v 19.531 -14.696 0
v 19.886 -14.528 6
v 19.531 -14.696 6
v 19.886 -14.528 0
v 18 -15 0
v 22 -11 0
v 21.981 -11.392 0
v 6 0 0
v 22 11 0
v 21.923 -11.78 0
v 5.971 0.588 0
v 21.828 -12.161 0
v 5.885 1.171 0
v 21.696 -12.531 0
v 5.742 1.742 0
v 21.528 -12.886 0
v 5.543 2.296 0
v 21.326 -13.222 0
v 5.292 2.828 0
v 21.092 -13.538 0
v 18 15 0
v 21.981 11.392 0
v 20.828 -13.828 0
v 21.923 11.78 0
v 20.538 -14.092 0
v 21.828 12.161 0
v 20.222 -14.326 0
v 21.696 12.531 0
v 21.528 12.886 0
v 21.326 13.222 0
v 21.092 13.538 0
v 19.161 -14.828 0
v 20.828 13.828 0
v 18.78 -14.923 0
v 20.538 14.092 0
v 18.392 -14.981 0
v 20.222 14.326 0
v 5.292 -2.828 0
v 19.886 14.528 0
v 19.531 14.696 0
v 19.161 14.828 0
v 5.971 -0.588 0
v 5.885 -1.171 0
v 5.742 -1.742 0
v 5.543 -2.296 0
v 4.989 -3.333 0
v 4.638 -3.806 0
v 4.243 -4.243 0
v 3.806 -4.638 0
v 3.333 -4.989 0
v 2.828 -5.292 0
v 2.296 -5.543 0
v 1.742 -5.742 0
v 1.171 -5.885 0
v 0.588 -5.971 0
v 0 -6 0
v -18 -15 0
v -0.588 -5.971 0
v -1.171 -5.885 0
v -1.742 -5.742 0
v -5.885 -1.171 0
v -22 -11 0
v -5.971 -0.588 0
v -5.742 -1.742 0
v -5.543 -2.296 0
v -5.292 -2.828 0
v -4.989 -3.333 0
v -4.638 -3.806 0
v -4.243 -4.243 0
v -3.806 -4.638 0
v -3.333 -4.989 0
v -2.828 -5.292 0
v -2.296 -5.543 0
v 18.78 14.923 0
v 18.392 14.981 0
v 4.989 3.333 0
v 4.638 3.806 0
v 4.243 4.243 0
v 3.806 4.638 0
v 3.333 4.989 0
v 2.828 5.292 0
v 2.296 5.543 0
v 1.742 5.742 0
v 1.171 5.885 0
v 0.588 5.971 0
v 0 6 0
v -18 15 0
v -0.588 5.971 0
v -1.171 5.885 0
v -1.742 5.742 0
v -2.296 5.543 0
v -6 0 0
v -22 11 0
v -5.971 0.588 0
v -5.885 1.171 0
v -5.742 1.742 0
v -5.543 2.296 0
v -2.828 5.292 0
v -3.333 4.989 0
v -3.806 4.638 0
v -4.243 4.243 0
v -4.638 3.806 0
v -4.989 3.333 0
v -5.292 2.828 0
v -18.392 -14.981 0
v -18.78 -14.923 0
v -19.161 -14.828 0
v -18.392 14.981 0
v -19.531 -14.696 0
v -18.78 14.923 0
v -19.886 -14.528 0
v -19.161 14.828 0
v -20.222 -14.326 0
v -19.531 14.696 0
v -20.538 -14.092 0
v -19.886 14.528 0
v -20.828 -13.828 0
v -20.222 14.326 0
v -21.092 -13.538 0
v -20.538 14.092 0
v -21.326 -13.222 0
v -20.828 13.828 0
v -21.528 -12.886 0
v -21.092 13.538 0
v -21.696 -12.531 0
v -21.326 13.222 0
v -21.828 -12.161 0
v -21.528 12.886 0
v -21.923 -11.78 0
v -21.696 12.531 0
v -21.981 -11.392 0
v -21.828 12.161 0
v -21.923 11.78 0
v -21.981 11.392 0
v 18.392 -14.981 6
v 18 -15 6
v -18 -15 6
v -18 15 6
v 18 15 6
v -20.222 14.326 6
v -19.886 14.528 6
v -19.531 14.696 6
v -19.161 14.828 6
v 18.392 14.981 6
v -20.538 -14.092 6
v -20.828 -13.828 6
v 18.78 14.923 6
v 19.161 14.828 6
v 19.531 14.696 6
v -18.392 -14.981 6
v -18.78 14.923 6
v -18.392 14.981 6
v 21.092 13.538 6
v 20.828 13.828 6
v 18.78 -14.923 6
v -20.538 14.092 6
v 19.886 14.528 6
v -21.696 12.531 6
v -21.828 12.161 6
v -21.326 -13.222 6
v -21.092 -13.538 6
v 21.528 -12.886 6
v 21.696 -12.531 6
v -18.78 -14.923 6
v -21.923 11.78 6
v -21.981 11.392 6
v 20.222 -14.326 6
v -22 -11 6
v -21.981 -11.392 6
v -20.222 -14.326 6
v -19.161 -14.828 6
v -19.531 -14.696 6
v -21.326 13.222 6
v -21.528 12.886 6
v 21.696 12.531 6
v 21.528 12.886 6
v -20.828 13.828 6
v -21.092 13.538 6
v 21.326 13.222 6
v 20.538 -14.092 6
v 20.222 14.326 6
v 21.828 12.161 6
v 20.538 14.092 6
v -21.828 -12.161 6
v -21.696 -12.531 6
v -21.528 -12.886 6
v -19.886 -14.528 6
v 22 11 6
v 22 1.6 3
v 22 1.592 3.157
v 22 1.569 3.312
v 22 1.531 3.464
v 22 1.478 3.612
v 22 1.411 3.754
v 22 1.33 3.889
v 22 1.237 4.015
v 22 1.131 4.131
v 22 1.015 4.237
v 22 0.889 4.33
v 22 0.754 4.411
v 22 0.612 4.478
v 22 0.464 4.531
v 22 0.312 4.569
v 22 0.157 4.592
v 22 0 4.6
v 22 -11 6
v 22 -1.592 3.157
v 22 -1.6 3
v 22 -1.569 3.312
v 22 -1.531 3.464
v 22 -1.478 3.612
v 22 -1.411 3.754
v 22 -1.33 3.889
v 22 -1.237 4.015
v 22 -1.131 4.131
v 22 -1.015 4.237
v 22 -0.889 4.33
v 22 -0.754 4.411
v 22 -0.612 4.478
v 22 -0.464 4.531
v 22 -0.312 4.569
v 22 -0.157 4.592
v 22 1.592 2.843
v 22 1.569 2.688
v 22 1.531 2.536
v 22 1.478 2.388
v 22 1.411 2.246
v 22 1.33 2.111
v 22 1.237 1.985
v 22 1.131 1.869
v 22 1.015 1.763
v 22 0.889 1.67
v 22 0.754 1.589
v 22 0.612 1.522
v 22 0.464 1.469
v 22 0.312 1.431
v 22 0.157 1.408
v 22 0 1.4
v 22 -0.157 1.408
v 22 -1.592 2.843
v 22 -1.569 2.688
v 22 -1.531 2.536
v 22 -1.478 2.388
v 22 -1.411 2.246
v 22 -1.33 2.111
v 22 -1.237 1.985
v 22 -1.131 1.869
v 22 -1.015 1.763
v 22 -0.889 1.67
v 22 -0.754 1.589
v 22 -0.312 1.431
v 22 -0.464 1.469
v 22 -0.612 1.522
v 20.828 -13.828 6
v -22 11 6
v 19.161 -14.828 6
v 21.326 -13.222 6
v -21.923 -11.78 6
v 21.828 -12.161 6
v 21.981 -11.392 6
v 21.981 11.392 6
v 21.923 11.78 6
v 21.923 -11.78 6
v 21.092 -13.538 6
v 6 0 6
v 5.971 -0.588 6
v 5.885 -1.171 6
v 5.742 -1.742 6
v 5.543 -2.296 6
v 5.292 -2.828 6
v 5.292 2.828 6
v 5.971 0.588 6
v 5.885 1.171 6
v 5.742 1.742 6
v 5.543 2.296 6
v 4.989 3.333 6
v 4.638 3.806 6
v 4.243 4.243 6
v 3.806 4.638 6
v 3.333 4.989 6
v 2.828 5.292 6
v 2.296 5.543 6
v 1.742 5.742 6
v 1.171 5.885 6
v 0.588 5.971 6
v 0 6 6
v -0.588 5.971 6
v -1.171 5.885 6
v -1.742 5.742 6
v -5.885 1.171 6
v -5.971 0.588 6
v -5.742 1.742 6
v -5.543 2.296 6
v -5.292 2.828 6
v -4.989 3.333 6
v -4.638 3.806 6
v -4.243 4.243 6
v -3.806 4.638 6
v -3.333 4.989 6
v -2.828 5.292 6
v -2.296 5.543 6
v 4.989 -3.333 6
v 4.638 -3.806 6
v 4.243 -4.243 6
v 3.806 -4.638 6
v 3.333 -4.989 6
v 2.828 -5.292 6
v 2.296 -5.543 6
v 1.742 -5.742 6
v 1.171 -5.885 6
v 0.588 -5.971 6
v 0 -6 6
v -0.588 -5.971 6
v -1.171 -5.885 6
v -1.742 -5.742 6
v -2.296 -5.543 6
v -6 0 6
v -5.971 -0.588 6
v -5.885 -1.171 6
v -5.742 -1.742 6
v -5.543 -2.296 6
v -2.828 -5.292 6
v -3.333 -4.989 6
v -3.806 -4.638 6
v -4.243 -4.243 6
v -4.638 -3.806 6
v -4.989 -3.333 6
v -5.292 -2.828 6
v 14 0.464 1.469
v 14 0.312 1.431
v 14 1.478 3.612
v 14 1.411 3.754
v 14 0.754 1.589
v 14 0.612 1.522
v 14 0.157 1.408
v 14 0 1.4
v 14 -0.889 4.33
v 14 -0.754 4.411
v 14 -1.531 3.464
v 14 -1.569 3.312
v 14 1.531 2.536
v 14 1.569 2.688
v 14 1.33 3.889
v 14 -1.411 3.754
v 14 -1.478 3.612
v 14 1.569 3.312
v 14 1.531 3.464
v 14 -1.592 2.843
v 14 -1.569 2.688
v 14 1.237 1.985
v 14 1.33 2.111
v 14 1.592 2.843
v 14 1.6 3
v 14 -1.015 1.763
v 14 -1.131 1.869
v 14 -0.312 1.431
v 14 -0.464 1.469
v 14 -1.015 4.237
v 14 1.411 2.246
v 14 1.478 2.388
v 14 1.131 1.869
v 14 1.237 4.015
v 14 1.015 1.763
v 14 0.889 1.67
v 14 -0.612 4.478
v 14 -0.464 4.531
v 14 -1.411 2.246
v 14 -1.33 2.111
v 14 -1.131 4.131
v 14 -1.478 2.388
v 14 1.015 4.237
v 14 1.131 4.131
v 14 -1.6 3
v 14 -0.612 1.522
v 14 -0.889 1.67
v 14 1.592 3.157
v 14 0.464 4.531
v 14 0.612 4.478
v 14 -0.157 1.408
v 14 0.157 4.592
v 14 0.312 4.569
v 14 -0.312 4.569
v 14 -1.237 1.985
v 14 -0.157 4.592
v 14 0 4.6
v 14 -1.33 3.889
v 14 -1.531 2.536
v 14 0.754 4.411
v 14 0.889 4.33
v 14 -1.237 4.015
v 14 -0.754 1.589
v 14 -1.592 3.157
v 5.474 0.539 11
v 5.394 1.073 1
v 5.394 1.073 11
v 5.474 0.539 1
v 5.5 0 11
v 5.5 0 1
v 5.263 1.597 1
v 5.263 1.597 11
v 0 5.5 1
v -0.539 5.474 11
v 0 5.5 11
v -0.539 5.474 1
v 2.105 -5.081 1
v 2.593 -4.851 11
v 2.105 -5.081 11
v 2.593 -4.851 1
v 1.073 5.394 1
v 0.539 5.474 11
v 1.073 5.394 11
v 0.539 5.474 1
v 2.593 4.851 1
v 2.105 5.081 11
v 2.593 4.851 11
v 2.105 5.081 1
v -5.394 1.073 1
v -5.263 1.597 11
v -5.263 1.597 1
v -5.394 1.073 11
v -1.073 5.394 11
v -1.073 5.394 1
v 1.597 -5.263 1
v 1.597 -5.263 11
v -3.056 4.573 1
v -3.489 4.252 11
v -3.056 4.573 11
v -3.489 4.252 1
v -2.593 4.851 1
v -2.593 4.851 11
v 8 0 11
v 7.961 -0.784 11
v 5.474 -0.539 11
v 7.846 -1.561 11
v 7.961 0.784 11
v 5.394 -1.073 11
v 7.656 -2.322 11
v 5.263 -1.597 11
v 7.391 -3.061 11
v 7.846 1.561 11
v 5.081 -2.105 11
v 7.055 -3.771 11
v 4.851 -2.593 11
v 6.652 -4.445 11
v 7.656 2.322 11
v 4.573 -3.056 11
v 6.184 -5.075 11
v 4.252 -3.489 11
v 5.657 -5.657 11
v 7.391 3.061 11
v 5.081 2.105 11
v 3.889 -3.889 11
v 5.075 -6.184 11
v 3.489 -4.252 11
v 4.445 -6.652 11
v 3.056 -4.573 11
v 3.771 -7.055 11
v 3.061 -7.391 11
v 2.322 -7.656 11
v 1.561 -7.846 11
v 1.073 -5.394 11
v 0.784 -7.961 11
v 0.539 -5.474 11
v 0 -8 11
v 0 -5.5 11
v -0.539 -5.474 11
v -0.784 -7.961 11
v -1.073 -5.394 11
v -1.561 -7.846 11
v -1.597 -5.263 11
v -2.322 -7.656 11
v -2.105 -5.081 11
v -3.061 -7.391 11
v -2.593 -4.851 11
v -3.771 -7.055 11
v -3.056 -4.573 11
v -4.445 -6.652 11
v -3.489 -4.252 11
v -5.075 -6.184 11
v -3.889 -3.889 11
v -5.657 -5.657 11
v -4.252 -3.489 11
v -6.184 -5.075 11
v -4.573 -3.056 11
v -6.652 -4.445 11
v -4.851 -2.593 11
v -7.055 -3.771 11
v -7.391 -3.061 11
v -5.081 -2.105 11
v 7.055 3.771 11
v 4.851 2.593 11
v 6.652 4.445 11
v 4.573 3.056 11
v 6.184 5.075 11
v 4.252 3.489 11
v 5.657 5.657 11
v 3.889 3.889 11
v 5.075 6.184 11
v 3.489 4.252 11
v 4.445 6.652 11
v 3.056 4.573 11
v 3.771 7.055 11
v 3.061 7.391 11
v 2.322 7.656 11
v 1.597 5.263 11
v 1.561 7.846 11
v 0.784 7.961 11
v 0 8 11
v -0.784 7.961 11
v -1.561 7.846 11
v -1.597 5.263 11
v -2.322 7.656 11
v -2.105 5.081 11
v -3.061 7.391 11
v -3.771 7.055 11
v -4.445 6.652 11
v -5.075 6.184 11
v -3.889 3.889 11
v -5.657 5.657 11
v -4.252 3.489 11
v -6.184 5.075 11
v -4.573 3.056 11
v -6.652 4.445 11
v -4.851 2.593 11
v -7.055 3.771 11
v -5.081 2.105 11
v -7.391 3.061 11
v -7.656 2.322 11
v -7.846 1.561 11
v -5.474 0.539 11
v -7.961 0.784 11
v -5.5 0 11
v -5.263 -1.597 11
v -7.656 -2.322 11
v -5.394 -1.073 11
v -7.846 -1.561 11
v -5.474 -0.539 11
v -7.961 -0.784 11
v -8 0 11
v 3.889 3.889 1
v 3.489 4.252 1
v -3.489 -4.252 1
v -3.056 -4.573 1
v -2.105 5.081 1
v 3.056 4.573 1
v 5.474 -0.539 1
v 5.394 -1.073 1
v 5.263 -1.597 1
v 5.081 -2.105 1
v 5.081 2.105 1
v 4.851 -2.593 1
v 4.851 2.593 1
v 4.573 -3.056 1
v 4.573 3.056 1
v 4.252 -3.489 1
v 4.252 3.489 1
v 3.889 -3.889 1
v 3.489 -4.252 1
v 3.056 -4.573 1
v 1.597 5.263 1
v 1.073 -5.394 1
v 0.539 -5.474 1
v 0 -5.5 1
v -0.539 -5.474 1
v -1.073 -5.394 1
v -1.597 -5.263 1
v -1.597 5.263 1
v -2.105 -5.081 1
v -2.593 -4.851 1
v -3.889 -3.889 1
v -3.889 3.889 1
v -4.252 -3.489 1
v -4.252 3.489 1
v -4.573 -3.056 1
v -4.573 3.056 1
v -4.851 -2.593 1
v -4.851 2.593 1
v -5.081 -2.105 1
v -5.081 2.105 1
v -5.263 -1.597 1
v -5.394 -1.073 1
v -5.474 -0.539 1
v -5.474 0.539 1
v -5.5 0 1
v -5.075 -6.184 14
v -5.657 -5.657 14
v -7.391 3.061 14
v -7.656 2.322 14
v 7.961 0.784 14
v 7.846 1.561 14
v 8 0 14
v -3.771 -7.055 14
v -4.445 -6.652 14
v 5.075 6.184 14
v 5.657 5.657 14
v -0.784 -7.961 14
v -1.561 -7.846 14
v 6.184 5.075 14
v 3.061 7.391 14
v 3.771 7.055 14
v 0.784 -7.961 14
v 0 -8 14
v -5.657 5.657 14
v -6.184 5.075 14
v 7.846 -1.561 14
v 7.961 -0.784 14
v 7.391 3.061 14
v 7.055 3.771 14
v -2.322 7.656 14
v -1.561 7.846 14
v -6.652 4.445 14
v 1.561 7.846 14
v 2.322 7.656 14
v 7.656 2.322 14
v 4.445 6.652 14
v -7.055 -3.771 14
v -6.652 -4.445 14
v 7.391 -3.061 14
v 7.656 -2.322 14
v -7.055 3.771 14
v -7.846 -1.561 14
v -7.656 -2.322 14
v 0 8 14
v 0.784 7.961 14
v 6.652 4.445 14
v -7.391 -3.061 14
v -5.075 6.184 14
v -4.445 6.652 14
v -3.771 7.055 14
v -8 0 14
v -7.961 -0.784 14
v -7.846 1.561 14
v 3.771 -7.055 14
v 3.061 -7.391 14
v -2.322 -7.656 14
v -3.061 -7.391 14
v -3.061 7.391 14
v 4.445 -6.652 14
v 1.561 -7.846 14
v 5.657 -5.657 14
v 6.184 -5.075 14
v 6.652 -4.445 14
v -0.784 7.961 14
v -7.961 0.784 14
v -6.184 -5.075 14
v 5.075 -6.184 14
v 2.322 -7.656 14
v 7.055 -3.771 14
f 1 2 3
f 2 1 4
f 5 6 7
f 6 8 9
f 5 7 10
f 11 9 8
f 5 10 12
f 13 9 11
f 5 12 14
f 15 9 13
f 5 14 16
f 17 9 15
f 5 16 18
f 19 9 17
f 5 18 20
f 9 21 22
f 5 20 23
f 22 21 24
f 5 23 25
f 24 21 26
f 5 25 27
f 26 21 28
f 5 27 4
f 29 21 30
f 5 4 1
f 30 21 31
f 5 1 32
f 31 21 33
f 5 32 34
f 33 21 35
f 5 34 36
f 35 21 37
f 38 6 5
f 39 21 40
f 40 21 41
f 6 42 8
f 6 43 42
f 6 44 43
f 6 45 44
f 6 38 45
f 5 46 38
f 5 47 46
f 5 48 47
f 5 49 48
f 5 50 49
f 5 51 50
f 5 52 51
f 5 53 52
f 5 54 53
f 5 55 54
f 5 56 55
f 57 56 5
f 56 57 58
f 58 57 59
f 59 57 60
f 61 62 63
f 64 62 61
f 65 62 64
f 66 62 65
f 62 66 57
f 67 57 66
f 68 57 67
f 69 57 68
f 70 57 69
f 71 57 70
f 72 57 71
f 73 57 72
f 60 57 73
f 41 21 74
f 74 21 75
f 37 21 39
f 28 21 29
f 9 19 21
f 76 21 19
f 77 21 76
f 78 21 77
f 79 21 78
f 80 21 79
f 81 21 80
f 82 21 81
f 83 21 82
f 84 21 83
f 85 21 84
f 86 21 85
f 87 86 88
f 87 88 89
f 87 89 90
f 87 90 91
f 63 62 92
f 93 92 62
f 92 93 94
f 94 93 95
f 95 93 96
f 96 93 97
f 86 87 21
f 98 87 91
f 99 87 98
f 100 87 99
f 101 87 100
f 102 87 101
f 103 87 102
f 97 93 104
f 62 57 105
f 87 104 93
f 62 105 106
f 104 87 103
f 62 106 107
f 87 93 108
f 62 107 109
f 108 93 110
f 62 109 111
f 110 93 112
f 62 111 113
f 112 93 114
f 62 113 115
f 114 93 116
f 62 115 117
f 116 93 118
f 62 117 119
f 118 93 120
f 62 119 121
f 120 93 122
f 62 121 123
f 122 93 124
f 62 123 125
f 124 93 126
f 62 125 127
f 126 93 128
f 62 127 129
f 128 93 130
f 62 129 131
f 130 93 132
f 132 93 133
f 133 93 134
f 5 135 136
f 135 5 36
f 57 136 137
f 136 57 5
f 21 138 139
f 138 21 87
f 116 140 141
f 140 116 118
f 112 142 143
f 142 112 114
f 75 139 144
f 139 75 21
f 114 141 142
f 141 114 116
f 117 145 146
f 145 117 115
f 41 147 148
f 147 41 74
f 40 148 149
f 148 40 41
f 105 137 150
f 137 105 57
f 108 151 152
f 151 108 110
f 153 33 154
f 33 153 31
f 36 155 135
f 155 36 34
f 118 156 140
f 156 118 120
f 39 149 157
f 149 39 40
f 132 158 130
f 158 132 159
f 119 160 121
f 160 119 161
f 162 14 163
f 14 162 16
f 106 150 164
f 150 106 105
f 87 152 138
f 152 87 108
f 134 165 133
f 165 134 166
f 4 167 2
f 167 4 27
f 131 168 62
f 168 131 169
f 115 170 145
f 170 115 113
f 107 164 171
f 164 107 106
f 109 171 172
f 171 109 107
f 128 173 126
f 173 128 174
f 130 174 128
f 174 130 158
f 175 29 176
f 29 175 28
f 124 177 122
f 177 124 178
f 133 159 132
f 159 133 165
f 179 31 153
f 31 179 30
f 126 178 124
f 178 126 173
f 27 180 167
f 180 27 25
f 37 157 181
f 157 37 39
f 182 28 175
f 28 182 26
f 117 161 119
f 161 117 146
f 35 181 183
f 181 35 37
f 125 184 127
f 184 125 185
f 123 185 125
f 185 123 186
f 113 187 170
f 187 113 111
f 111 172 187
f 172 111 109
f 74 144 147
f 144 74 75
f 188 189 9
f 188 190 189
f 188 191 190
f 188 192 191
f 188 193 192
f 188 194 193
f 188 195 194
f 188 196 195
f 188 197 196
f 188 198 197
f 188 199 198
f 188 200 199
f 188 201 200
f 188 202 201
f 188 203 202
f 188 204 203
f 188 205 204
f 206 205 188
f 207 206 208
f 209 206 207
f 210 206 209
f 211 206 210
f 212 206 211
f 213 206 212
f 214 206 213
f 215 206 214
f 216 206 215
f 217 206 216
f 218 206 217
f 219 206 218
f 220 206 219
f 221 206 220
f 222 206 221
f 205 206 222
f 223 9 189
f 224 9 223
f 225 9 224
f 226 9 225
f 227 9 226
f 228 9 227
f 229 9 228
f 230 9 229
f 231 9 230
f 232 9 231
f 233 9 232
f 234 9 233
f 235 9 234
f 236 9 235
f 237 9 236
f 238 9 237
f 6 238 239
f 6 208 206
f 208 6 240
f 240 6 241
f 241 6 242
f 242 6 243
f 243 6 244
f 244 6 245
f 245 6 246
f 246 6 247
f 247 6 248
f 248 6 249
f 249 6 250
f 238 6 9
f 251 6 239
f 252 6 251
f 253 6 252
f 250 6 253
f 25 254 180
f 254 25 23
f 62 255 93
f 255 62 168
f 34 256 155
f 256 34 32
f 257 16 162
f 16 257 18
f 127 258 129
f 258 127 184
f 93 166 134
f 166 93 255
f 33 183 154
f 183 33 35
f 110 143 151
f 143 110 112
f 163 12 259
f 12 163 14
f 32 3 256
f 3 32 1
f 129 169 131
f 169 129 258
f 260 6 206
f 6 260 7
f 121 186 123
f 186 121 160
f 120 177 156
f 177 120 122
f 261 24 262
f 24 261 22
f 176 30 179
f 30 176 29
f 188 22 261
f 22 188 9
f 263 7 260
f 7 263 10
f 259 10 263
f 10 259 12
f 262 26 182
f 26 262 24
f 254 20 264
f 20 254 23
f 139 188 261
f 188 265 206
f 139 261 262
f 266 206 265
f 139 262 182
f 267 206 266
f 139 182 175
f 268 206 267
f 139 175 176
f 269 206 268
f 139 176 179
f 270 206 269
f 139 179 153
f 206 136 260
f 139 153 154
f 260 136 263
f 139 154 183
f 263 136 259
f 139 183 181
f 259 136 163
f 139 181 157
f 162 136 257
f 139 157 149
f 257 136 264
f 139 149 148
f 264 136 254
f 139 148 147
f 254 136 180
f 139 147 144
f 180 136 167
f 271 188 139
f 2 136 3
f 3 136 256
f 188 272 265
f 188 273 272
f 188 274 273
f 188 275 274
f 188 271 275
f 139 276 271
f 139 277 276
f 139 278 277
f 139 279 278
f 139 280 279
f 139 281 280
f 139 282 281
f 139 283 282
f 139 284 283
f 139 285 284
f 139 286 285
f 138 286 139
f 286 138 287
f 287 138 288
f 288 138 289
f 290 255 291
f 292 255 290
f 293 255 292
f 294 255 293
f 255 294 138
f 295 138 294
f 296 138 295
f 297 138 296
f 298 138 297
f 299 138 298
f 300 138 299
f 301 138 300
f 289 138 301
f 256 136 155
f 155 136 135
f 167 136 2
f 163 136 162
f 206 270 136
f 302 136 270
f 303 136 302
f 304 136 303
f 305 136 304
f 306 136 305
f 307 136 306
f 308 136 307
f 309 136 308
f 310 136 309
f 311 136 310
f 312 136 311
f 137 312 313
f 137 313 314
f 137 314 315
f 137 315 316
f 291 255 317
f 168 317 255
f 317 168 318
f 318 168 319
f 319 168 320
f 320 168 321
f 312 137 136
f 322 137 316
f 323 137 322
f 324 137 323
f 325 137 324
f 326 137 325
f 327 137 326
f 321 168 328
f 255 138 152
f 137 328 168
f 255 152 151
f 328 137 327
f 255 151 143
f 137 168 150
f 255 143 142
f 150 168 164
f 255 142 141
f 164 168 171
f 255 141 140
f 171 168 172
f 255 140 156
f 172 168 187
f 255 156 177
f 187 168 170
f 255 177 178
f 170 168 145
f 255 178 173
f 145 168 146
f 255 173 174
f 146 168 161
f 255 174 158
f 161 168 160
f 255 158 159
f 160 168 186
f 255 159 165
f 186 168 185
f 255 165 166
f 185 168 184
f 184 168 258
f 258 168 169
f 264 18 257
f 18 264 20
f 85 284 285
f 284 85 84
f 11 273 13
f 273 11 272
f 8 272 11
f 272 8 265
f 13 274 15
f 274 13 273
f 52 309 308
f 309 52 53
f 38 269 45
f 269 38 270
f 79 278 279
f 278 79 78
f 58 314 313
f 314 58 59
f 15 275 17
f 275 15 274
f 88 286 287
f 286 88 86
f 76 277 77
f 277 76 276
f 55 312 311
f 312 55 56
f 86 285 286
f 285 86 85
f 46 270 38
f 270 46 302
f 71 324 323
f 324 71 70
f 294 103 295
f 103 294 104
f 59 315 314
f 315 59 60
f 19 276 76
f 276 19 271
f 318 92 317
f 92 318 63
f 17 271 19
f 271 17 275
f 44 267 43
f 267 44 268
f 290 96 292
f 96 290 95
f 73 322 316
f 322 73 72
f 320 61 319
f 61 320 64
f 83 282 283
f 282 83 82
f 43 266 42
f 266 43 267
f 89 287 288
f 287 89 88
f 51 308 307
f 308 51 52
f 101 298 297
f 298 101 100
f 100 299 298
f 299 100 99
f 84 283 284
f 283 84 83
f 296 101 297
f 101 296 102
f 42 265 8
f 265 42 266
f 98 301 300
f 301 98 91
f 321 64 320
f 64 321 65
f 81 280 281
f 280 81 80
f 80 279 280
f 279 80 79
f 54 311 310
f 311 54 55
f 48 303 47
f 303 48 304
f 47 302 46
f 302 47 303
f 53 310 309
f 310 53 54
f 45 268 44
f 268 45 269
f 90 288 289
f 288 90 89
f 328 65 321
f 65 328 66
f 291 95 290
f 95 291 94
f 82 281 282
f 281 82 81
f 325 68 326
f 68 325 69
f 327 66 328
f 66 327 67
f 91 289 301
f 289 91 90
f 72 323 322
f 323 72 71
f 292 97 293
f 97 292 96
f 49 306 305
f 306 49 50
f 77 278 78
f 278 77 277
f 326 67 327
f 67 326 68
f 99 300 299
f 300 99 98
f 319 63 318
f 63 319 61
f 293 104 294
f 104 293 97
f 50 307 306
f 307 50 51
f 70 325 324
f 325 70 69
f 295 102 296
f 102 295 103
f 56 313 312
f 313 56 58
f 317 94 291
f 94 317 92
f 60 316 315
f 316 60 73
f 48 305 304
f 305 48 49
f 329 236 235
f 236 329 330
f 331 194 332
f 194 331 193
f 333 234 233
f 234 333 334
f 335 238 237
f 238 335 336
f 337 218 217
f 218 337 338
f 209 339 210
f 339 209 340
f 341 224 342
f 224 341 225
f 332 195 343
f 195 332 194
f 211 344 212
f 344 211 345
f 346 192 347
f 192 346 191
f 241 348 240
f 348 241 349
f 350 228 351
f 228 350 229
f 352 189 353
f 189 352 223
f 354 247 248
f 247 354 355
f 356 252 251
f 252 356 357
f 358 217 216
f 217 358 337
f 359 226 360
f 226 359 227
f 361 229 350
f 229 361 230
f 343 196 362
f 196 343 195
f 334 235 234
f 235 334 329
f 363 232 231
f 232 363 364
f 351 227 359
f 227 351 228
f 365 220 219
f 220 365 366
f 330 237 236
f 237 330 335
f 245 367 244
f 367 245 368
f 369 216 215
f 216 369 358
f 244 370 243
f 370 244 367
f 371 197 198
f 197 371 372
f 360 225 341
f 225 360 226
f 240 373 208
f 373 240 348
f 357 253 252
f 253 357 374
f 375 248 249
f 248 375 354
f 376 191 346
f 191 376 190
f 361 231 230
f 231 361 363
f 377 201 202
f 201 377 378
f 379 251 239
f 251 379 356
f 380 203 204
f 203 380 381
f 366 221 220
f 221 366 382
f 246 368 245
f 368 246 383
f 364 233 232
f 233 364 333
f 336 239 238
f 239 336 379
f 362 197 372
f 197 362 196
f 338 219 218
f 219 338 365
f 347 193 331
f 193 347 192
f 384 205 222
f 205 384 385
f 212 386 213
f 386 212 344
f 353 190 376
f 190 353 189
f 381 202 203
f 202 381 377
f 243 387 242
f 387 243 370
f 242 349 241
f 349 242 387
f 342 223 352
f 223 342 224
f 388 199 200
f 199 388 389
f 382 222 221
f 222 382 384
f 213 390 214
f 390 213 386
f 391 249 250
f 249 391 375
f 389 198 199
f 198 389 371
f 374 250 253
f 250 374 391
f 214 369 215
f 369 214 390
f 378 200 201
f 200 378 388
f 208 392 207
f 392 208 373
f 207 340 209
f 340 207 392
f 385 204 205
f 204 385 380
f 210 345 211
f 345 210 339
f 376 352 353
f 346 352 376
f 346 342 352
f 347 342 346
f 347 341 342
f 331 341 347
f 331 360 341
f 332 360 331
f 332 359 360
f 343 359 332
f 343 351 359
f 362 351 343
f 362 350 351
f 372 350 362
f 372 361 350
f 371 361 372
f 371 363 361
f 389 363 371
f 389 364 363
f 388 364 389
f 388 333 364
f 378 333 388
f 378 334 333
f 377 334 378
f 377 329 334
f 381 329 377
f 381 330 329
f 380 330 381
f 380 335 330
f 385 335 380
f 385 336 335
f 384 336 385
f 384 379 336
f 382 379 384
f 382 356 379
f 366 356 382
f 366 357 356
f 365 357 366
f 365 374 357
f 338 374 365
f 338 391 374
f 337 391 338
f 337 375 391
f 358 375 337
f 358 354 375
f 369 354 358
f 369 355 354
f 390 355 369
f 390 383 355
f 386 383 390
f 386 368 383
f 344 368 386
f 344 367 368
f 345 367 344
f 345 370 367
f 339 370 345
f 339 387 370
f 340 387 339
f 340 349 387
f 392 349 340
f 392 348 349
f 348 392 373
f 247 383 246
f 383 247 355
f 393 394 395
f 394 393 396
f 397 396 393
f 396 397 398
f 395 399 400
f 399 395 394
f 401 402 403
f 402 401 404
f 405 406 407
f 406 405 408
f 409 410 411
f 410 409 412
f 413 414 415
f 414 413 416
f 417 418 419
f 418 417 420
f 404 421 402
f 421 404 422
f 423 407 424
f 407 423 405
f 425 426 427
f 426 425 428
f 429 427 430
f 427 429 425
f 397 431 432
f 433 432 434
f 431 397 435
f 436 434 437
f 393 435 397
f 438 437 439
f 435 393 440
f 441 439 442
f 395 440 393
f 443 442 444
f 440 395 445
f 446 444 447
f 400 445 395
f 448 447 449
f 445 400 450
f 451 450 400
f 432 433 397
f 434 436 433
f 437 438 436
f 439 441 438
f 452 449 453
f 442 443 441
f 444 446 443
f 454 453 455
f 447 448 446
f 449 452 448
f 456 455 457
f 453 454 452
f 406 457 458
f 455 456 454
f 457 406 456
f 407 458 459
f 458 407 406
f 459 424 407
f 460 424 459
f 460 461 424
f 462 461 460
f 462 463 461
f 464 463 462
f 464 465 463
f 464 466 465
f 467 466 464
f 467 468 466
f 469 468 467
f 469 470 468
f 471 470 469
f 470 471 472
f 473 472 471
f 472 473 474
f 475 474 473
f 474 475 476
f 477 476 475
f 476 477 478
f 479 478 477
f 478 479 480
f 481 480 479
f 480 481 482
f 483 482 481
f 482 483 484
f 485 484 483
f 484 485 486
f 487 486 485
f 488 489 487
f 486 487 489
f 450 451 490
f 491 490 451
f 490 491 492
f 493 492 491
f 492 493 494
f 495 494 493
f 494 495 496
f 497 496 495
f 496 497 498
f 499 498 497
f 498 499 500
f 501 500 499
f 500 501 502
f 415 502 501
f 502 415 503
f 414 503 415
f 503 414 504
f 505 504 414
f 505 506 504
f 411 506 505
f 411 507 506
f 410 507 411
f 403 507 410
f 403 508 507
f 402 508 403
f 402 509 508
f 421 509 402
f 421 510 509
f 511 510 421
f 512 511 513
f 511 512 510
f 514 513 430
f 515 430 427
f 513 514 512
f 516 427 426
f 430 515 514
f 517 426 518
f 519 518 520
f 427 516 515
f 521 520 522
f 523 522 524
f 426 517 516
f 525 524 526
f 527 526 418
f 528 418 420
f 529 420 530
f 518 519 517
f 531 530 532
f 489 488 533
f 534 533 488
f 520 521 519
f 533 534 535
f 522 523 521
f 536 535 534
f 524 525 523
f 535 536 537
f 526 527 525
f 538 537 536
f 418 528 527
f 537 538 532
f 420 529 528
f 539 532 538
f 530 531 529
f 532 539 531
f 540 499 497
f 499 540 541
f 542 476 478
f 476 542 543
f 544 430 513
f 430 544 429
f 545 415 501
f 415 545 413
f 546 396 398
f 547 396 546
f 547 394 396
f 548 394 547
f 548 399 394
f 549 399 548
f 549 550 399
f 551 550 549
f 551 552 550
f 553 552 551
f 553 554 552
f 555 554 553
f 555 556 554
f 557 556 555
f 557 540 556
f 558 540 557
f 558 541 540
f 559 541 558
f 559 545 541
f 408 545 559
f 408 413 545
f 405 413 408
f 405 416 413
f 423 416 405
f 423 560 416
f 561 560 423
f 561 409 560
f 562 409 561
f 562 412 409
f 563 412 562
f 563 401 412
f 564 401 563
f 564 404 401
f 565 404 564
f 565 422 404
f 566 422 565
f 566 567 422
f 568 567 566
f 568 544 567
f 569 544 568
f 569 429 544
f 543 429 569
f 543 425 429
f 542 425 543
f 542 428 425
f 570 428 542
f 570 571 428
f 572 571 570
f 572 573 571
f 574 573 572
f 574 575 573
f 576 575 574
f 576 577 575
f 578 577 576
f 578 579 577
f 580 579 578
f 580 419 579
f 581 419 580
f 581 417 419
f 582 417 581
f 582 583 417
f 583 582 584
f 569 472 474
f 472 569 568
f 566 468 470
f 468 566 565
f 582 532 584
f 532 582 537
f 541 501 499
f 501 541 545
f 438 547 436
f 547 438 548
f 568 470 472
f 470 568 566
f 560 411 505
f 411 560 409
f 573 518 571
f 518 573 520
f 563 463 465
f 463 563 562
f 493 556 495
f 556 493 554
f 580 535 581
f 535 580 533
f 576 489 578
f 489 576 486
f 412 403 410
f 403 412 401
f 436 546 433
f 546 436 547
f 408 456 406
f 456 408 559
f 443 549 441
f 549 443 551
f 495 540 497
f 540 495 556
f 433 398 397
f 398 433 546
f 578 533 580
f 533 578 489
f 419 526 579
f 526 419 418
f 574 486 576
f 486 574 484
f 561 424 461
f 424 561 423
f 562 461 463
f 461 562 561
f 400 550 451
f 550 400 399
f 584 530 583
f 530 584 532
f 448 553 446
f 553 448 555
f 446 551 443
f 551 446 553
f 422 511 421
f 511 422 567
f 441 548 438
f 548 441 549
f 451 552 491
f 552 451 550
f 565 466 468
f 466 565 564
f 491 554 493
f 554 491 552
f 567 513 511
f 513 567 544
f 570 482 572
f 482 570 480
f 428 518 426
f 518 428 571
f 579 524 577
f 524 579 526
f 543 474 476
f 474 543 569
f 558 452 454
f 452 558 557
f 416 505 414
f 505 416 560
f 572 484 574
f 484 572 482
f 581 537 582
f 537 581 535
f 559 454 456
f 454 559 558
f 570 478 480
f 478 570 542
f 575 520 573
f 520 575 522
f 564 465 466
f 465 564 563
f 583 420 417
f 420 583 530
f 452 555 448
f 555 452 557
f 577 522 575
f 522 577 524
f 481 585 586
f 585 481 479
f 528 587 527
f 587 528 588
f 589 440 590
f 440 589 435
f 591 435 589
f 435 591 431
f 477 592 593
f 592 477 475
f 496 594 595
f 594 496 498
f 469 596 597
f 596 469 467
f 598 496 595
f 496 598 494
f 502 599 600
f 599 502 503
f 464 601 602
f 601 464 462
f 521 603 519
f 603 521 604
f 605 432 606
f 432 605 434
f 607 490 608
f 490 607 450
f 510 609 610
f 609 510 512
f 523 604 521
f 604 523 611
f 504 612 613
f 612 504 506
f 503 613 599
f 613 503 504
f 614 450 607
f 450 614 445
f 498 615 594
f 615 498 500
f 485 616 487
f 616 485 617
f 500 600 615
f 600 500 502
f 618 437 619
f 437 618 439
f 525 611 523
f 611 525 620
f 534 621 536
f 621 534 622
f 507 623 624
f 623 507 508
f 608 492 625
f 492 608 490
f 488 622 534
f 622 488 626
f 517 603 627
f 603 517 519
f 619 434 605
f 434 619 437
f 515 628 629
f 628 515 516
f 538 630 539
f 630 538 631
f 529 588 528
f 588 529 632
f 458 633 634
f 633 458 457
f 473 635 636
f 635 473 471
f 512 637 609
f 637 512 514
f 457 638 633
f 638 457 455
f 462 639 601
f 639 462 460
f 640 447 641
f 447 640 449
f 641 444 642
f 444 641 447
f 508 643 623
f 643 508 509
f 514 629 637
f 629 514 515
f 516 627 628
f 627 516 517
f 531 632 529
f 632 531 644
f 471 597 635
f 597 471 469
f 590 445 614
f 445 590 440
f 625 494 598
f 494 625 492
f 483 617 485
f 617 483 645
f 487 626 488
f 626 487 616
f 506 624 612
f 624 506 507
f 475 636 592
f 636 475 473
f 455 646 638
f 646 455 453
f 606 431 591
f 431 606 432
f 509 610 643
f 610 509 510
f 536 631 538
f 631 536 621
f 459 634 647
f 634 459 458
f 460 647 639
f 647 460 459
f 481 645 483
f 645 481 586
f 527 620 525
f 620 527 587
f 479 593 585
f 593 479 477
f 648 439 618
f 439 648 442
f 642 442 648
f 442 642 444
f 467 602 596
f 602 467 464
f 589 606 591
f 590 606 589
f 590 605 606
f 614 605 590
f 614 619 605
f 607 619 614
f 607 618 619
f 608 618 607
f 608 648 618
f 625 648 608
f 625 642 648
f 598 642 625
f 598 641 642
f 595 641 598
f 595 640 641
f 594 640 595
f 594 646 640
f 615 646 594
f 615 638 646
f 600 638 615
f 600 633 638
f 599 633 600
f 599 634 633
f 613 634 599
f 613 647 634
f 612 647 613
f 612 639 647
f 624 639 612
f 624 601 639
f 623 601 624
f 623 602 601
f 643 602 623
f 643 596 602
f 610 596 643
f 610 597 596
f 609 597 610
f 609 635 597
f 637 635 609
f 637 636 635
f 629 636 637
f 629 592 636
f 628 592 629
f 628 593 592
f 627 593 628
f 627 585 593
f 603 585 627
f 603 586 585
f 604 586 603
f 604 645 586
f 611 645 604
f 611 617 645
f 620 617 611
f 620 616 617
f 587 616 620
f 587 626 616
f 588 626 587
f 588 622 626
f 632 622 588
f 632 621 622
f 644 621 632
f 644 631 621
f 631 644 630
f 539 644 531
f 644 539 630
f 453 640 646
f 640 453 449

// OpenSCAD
// =====================================================================
//  demo.scad — DEMONSTRATION piece for the tools guide in docs/.
//  A rounded plate with a hole + a peg that fits with clearance,
//  to illustrate the tools (views, slice, parts, clearances...). A catalogue
//  of named modules, like a real main.scad: name them in --parts.
// =====================================================================
$fn = 64;

// 44x30x6 plate, r=4 corners, central hole Ø12 + M3 side drill.
module plate() {
  difference() {
    linear_extrude(6) offset(4) square([36, 22], center = true);
    translate([0, 0, -1]) cylinder(d = 12, h = 8);             // central hole Ø12
    translate([14, 0, 3]) rotate([0, 90, 0]) cylinder(d = 3.2, h = 12); // side drill
  }
}
// Ø11 peg (0.5 mm radial clearance in the hole) with a Ø16 head.
module peg() {
  cylinder(d = 11, h = 10);
  translate([0, 0, 10]) cylinder(d = 16, h = 3);
}
// WORLD/SEATED positions (for --parts): the peg inserted in the hole.
module plate_seated() plate();
module peg_seated() translate([0, 0, 1]) peg();

// Assembly (showcase): plate + seated peg.
module assembly() { color("steelblue") plate_seated(); color("orange") peg_seated(); }

assembly();   // default view when opened in OpenSCAD (use ignores it)
